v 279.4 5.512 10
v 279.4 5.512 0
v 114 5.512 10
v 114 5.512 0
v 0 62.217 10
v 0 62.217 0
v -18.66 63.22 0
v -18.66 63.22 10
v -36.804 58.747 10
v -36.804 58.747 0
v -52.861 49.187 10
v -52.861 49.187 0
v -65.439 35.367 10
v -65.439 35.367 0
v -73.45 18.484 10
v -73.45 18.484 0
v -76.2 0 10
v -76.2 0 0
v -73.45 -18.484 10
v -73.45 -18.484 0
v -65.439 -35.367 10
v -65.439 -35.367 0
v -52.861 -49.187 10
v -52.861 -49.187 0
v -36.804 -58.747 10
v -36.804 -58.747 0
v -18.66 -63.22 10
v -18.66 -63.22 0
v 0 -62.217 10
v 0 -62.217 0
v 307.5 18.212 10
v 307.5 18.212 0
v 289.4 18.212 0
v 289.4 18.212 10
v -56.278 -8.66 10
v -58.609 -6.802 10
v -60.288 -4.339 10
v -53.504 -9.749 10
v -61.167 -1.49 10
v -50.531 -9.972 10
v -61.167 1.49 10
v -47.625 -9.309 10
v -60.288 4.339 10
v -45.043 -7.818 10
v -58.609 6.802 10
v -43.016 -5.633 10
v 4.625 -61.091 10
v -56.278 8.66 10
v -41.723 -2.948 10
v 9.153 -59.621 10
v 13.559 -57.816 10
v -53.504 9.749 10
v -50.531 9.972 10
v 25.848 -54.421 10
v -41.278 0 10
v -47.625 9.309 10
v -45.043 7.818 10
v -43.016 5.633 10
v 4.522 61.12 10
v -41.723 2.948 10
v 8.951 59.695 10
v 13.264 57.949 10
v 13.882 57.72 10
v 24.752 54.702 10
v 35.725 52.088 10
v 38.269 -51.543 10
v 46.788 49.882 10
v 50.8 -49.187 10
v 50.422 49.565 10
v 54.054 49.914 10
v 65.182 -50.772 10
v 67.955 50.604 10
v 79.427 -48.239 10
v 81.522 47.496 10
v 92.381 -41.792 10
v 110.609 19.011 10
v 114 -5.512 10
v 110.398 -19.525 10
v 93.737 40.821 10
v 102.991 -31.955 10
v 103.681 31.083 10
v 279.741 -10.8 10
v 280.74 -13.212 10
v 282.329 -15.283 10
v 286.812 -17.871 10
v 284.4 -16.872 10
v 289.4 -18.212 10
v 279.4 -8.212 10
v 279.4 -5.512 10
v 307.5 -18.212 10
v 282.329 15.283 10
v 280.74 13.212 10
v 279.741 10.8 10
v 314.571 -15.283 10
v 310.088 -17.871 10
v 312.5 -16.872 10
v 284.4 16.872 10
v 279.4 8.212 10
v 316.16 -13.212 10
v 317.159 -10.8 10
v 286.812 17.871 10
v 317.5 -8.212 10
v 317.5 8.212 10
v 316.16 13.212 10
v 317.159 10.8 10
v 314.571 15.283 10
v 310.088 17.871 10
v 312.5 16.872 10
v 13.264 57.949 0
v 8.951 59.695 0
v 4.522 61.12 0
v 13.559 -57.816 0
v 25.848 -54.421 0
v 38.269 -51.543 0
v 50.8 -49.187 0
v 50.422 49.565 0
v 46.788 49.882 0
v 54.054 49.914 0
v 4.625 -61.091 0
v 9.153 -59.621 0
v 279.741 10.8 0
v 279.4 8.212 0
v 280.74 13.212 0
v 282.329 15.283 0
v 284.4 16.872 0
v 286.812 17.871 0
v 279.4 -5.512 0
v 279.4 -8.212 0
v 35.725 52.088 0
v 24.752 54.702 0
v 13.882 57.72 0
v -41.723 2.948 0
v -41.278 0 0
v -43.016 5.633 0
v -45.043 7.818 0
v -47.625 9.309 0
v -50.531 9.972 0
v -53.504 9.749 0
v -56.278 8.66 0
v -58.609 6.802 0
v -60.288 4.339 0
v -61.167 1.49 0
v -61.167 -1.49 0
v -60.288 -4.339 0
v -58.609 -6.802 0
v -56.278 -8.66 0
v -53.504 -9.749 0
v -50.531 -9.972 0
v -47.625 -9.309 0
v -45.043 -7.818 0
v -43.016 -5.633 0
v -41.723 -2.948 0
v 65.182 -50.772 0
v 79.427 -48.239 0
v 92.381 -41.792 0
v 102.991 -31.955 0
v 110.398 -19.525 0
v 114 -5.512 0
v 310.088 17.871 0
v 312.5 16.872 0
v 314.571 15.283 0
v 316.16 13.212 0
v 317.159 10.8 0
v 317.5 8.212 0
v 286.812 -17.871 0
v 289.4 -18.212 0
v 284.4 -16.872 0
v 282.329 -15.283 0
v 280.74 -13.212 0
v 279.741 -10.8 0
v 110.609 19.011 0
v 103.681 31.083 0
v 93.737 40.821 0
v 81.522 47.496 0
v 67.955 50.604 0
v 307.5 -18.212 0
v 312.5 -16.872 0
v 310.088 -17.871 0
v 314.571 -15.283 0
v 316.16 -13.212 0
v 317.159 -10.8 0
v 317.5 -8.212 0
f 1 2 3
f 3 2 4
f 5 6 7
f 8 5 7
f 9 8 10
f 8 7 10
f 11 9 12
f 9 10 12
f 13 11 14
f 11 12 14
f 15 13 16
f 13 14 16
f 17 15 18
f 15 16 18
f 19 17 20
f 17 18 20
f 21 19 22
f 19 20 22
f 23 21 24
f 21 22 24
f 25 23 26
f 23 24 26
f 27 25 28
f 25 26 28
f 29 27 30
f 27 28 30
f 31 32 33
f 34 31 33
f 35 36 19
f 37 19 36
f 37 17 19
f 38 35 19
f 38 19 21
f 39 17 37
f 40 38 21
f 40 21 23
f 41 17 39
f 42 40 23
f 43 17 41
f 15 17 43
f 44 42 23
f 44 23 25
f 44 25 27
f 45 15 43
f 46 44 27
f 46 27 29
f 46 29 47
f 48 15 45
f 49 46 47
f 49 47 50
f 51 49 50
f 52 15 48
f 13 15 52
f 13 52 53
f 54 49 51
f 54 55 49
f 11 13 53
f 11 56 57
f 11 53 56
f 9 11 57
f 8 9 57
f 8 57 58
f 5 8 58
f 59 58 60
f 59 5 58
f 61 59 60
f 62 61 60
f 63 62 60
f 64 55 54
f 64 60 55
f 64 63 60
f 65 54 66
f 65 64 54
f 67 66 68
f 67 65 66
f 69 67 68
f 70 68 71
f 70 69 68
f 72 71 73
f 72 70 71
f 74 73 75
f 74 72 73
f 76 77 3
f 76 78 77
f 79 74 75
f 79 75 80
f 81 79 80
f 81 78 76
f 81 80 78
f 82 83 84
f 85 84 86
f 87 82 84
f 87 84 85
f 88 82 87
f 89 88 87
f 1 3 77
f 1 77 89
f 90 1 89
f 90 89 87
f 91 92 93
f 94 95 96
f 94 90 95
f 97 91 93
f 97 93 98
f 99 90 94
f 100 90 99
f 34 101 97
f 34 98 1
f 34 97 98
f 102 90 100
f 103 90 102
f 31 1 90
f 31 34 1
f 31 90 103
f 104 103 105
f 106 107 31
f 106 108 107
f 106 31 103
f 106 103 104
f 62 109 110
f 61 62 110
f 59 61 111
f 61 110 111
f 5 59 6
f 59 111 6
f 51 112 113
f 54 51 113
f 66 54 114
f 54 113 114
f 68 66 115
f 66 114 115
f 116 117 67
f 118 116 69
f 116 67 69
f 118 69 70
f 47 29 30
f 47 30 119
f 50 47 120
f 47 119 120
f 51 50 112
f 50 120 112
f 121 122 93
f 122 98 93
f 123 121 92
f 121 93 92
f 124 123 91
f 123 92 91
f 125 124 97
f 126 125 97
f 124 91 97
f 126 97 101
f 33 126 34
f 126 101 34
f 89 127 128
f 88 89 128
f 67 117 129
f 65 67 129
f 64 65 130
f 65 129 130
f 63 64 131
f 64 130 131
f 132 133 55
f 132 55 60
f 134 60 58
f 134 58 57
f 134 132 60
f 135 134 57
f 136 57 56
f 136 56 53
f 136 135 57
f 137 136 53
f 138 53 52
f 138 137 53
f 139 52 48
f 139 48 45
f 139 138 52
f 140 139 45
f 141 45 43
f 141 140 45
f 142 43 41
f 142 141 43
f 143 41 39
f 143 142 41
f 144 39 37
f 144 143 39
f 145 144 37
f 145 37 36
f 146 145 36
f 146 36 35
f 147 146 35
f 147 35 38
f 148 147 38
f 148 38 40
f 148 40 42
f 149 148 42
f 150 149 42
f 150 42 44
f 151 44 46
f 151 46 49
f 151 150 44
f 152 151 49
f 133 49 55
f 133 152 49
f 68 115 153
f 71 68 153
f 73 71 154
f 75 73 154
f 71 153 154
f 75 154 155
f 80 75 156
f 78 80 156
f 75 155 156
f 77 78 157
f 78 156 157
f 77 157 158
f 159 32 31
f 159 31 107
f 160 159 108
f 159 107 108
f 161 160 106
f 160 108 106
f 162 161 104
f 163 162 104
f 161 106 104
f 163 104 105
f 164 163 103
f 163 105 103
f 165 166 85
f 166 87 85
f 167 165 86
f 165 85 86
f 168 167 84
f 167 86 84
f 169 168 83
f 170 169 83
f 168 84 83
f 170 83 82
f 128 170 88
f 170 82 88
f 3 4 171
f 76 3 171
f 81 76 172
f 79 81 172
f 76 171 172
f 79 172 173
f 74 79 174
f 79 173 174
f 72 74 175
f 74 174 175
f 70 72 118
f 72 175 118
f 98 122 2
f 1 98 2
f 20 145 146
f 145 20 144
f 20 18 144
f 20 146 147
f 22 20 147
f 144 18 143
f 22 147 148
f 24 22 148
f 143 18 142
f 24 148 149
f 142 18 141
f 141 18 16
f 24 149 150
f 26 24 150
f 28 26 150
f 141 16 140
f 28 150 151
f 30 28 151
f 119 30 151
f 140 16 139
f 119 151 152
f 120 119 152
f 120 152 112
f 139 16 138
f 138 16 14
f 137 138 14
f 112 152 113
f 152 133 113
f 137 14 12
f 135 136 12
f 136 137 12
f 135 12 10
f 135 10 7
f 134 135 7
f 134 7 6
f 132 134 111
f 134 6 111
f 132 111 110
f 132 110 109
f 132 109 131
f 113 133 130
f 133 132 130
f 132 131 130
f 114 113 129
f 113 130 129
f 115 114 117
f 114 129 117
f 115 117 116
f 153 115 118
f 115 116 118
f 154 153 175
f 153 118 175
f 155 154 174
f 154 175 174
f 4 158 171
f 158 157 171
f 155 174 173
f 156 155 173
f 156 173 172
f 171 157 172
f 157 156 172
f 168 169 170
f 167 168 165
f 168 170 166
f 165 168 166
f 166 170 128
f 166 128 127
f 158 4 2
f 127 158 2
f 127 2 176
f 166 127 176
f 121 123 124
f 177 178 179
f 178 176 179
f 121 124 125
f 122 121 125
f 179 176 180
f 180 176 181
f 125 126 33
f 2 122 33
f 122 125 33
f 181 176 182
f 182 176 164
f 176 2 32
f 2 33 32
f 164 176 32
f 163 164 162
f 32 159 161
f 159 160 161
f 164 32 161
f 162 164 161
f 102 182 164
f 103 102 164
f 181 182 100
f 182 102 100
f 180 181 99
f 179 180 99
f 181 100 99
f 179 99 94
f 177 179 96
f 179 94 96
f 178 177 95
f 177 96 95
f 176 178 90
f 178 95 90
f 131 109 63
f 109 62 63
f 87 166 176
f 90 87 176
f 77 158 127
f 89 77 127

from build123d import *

# Parameters (mm, degrees)
F0_R     = 10
F1_DEPTH = 10
F2_R     = 5
F3_R     = 20
F4_R     = 10
F5_R     = 10


with BuildPart() as f1:
    # F0 (on Top) → F1 (new body)
    with BuildSketch(Plane.XY):
        with BuildLine():
            ThreePointArc((0, 62.217039), (6.753539, 59.93746), (13.558537, 57.816427))
            ThreePointArc((13.558537, 57.816427), (6.903144, 60.3984), (0, 62.217039))
        make_face()
        with BuildLine():
            ThreePointArc((50.8, 49.186888), (32.043845, 52.917227), (13.558537, 57.816427))
            ThreePointArc((13.558537, 57.816427), (6.753539, 59.93746), (0, 62.217039))
            ThreePointArc((0, 62.217039), (-76.2, 0), (0, -62.217039))
            ThreePointArc((0, -62.217039), (6.753539, -59.93746), (13.558537, -57.816427))
            ThreePointArc((13.558537, -57.816427), (32.043845, -52.917227), (50.8, -49.186888))
            ThreePointArc((50.8, -49.186888), (92.38062, -41.791743), (114.0001, -5.5118))
            ThreePointArc((114.0001, -5.5118), (114.3, 0), (114.0001, 5.5118))
            ThreePointArc((114.0001, 5.5118), (92.38062, 41.791743), (50.8, 49.186888))
        make_face()
        with Locations((-51.278312, 0)):
            Circle(F0_R, mode=Mode.SUBTRACT)
        with BuildLine():
            ThreePointArc((13.558537, -57.816427), (6.753539, -59.93746), (0, -62.217039))
            ThreePointArc((0, -62.217039), (6.903144, -60.3984), (13.558537, -57.816427))
        make_face()
        with BuildLine():
            Line((279.4, 5.5118), (114.0001, 5.5118))
            ThreePointArc((114.0001, 5.5118), (114.3, 0), (114.0001, -5.5118))
            Line((114.0001, -5.5118), (279.4, -5.5118))
            Line((279.4, -5.5118), (279.4, 0))
            Line((279.4, 0), (279.4, 5.5118))
        make_face()
        Polygon((279.4, 18.2118), (279.4, 5.5118), (279.4, 0), (279.4, -5.5118), (279.4, -18.2118), (317.5, -18.2118), (317.5, 18.2118), align=None)
    extrude(amount=F1_DEPTH)

    # F2
    f2_edges = [f1.edges().sort_by_distance(p)[0] for p in [
        (13.558537, 57.816427, 5),
    ]]
    fillet(f2_edges, radius=F2_R)

    # F3
    f3_edges = [f1.edges().sort_by_distance(p)[0] for p in [
        (50.8, 49.186888, 5),
    ]]
    fillet(f3_edges, radius=F3_R)

    # F4
    f4_edges = [f1.edges().sort_by_distance(p)[0] for p in [
        (317.5, 18.2118, 5),
        (279.4, 18.2118, 5),
    ]]
    fillet(f4_edges, radius=F4_R)

    # F5
    f5_edges = [f1.edges().sort_by_distance(p)[0] for p in [
        (317.5, -18.2118, 5),
        (279.4, -18.2118, 5),
    ]]
    fillet(f5_edges, radius=F5_R)


solid = f1.part
